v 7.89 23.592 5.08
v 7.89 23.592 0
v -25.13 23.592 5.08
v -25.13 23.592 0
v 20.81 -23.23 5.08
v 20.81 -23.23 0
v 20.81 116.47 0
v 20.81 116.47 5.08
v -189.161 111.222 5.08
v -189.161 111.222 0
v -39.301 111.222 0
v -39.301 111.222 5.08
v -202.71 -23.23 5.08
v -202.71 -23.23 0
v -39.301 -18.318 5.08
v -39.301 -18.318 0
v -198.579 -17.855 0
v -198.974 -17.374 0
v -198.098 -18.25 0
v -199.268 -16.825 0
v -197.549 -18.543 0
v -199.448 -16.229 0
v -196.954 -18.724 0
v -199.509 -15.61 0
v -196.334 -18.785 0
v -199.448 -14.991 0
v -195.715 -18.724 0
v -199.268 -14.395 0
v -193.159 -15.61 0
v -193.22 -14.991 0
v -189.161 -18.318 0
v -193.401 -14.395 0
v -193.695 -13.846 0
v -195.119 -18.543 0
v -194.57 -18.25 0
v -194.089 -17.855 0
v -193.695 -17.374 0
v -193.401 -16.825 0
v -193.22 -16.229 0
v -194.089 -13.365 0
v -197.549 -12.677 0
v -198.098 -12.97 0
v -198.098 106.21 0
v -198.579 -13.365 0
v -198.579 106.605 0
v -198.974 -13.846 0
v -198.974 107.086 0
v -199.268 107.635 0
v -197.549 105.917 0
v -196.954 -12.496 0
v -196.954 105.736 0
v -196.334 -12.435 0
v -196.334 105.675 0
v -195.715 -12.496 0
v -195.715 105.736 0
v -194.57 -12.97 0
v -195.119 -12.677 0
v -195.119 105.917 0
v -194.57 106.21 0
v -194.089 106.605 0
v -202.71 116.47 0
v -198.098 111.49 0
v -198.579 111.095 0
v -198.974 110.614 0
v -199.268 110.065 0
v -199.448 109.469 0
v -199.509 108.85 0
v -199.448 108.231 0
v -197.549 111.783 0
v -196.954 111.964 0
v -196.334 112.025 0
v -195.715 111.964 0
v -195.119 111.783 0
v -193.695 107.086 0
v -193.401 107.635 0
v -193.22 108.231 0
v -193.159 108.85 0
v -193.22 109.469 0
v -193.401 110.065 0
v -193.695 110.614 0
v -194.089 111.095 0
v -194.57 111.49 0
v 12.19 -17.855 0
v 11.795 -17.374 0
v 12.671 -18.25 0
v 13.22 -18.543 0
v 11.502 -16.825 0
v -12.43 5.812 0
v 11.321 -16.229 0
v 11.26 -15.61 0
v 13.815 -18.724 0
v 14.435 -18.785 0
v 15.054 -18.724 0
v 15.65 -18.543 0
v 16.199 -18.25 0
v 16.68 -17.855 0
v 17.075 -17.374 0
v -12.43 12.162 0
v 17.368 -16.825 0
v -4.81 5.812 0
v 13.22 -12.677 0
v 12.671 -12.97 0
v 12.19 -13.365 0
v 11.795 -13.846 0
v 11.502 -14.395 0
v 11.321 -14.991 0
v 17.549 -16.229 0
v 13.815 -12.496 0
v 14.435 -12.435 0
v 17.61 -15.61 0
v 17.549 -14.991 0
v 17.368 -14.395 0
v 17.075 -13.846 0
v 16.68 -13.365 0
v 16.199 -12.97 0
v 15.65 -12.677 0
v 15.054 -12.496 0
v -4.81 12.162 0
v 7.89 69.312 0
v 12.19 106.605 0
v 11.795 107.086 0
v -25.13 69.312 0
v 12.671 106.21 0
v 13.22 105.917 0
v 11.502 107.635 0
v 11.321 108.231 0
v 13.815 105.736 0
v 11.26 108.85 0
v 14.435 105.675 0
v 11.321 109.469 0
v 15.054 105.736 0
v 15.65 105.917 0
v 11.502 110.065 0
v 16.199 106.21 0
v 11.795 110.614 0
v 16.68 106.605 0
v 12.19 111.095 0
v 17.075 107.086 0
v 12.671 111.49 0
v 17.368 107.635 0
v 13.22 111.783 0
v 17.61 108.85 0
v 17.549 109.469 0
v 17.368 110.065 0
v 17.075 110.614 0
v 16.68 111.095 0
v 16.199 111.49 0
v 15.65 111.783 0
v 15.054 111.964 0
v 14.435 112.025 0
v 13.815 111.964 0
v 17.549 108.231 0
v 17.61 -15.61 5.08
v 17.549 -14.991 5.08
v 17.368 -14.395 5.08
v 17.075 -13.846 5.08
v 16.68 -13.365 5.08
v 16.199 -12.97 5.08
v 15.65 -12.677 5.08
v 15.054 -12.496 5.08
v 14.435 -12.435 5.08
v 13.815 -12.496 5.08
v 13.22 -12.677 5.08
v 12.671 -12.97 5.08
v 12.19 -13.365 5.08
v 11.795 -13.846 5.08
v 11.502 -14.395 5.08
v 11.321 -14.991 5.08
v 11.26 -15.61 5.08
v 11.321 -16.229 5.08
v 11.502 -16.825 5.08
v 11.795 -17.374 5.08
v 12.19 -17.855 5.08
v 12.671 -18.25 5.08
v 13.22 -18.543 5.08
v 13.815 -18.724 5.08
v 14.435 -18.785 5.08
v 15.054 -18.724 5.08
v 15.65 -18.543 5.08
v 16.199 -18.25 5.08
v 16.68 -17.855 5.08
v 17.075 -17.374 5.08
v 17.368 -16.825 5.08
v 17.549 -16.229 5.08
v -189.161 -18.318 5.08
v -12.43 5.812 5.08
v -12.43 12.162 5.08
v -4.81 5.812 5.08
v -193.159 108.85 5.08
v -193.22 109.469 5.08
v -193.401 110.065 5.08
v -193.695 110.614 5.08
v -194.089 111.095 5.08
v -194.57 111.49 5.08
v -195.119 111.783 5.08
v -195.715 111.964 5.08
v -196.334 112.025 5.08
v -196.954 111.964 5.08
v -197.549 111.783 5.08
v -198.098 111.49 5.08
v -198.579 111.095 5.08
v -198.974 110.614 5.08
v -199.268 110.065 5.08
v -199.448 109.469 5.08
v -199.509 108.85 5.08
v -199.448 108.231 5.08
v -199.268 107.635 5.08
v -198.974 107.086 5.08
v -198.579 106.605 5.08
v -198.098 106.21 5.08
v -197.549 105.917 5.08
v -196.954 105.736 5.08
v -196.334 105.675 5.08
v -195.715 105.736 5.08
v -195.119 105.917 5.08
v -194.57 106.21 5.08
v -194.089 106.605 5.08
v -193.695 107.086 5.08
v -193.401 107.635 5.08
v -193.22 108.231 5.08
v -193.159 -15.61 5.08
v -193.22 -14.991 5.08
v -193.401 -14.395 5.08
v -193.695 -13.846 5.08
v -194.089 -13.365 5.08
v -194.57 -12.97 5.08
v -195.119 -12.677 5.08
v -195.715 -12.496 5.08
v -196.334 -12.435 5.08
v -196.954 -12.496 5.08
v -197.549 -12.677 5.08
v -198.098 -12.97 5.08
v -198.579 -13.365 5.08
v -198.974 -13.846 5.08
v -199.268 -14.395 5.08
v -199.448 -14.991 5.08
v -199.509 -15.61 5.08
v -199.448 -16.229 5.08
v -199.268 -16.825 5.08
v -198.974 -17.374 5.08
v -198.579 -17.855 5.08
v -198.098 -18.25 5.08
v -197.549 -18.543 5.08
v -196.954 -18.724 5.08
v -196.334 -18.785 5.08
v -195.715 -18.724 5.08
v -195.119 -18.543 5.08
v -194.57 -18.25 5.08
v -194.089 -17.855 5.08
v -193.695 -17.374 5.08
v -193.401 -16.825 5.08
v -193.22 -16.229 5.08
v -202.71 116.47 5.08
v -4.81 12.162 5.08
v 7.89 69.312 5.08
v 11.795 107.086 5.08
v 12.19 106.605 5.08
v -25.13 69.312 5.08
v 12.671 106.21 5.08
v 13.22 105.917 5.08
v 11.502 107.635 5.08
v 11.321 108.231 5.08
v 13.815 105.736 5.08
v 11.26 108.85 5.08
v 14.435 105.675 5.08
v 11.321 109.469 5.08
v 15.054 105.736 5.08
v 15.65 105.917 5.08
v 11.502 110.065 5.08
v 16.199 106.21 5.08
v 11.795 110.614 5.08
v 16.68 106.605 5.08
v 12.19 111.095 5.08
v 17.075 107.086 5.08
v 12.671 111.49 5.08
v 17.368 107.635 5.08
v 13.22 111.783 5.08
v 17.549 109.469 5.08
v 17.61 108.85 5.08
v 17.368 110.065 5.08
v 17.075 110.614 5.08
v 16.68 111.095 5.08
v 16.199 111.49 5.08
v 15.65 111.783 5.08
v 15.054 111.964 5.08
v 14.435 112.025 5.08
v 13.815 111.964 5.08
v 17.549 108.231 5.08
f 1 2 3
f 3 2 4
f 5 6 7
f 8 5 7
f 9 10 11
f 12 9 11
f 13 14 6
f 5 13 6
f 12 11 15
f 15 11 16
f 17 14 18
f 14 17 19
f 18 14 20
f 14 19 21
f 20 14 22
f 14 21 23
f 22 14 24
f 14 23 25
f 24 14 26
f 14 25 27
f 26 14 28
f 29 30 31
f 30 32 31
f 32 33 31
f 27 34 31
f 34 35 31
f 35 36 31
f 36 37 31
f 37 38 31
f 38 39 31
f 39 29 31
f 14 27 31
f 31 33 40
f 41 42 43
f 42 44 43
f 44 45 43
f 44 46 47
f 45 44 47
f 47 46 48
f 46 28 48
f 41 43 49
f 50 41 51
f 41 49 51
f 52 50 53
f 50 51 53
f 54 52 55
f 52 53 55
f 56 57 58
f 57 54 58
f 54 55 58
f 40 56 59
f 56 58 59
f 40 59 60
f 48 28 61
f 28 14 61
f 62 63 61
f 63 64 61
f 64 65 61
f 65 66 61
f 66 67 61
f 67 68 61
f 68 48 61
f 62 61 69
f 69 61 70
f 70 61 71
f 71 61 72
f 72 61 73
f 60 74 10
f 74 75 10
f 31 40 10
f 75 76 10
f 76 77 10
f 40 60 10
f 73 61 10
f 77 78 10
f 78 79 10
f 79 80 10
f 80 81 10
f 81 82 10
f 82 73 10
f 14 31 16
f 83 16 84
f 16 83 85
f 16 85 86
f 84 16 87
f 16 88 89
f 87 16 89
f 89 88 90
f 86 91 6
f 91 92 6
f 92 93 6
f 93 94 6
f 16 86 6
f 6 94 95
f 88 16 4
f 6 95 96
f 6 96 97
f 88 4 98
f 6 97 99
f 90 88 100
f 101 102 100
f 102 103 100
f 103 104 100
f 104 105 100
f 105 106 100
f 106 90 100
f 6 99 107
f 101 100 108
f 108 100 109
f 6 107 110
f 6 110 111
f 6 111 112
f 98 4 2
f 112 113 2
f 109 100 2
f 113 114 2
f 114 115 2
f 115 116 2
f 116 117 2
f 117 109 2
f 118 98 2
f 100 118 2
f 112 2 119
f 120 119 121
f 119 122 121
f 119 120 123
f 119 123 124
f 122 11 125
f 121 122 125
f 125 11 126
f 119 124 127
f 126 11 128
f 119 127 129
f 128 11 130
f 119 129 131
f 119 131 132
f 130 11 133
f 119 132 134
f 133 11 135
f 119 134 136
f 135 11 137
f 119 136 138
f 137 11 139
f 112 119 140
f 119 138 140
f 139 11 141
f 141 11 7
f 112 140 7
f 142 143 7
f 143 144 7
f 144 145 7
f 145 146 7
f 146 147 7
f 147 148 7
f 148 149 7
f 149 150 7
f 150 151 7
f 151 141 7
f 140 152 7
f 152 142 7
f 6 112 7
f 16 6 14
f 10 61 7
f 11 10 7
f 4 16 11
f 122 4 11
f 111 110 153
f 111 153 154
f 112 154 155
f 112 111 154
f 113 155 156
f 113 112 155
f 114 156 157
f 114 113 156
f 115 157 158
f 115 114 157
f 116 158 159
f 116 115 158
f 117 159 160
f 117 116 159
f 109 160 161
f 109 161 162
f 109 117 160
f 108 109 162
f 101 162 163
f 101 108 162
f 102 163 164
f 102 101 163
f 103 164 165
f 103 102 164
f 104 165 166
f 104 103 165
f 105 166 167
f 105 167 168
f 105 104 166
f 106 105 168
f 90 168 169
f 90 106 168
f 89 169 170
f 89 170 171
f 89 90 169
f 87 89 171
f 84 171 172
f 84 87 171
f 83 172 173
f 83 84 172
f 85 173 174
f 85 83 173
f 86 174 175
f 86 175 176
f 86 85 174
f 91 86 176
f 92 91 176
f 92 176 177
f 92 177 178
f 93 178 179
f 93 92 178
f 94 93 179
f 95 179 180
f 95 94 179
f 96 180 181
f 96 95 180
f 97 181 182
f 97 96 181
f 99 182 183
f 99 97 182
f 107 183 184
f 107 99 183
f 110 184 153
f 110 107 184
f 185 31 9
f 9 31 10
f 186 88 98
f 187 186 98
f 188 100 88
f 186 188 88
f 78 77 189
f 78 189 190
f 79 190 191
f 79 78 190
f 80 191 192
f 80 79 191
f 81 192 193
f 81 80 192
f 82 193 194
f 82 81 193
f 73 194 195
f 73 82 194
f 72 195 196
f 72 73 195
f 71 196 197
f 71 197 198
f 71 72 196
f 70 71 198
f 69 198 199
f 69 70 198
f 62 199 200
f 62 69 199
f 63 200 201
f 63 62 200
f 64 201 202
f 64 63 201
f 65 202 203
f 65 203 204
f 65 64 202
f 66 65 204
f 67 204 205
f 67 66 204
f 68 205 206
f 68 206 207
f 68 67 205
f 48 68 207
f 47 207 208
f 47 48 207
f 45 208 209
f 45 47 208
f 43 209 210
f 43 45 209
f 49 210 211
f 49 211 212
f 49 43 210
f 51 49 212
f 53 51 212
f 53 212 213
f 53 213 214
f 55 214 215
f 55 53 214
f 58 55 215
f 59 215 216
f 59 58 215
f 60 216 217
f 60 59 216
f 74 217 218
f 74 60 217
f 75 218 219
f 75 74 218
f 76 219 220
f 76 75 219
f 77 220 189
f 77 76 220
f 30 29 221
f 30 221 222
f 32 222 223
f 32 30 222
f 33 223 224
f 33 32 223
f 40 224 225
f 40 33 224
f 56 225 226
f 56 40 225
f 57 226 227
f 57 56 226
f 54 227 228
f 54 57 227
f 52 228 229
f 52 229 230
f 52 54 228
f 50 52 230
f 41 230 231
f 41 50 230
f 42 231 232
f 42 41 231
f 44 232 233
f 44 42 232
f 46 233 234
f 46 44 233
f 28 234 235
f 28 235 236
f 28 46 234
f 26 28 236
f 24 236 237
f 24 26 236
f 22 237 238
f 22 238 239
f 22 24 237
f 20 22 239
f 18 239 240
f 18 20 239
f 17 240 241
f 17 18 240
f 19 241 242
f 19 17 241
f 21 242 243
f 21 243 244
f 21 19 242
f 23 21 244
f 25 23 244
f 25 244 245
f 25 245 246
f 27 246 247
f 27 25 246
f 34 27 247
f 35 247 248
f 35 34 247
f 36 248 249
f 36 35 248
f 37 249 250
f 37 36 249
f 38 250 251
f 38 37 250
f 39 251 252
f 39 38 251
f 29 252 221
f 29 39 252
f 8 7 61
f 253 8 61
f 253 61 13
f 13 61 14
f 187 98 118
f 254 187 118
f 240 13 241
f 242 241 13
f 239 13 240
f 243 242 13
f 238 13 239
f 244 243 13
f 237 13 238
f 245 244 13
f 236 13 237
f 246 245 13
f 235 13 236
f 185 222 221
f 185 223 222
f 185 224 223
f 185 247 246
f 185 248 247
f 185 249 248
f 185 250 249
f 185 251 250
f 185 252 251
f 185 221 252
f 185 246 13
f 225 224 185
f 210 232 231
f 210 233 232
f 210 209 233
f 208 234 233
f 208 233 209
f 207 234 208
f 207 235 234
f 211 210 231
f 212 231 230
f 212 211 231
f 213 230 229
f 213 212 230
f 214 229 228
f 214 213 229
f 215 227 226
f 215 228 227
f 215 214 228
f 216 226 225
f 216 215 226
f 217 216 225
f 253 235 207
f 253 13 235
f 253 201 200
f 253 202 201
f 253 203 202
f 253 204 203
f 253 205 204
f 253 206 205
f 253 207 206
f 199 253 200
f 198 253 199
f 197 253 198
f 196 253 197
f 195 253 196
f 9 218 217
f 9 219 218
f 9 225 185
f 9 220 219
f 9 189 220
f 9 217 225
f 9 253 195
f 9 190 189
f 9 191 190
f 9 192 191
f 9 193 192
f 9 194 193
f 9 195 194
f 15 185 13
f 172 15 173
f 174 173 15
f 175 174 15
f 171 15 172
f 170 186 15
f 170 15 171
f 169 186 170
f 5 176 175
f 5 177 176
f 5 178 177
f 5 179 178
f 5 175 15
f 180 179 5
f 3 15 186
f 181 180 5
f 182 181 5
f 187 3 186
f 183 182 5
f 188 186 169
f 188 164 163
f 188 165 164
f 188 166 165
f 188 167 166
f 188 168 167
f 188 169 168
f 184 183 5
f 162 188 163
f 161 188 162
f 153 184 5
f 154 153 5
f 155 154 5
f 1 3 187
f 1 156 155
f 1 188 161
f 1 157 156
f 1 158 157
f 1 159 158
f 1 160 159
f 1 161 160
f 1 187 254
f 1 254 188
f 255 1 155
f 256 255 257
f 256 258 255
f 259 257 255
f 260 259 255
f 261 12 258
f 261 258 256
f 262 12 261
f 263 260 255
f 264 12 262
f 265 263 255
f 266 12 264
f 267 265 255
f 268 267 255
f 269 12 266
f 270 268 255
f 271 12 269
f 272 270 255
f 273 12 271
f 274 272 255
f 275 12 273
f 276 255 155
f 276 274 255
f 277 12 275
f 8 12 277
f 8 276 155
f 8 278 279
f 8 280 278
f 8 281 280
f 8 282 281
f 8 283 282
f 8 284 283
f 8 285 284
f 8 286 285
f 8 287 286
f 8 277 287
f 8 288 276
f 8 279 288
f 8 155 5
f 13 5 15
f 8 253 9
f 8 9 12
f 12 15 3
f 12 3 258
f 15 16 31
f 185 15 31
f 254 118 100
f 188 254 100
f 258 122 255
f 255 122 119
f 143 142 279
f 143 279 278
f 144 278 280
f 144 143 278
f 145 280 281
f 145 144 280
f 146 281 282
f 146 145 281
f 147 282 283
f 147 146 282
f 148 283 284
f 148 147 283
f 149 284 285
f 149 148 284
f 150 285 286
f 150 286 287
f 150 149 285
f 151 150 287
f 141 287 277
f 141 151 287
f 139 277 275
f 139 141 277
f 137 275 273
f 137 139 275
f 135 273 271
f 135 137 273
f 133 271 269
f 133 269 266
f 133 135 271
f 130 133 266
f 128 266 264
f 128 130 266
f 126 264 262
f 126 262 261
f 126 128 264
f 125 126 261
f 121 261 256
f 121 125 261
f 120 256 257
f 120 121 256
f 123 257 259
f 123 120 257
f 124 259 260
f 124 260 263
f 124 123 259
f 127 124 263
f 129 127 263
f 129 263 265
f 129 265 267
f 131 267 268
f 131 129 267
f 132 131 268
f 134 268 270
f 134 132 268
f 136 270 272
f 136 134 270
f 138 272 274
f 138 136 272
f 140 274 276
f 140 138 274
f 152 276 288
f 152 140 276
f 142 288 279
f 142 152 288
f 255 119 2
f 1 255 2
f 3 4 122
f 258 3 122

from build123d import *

# Parameters (mm, degrees)
F0_R     = 3.175
F1_DEPTH = 5.08


with BuildPart() as f1:
    # F0 (on Top) → F1 (new body)
    with BuildSketch(Plane.XY):
        Polygon((-196.7800016522, 116.4700038791), (-196.7814051471, 116.4700038791), (-202.7097940445, 116.4700038791), (-202.7097940445, 108.8500038791), (-202.7097940445, 101.2300038791), (-202.7097940445, -23.2299961209), (-196.7800016522, -23.2299961209), (20.8102059555, -23.2299961209), (20.8102059555, 116.4700038791), (15.3085948529, 116.4700038791), (-35.4914051471, 116.4700038791), (-39.3014051471, 116.4700038791), (-90.9497940445, 116.4700038791), (-187.4697940445, 116.4700038791), (-189.1614051471, 116.4700038791), (-195.0897940445, 116.4700038791), align=None)
        with Locations((-196.3344303894, -15.6099961209)):
            Circle(F0_R, mode=Mode.SUBTRACT)
        Polygon((-189.1614051471, -18.3182691255), (-189.1614051471, 111.2217308745), (-189.1583133745, 111.2217308745), (-39.3014051471, 111.2217308745), (-39.3014051471, -18.3182691255), align=None, mode=Mode.SUBTRACT)
        with Locations((14.4348423004, -15.6099961209)):
            Circle(F0_R, mode=Mode.SUBTRACT)
        Polygon((-25.1297818765, 23.5917308745), (-25.1297818765, 69.3117308745), (7.8902181235, 69.3117308745), (7.8902181235, 23.5917308745), (7.8902181235, 5.8117308745), (-4.8097818765, 5.8117308745), (-8.6197818765, 5.8117308745), (-12.4297818765, 5.8117308745), (-25.1297818765, 5.8117308745), align=None, mode=Mode.SUBTRACT)
        with Locations((-196.3344303894, 108.8500038791)):
            Circle(F0_R, mode=Mode.SUBTRACT)
        with Locations((14.4348423004, 108.8500038791)):
            Circle(F0_R, mode=Mode.SUBTRACT)
        Polygon((7.8902181235, 23.5917308745), (-25.1297818765, 23.5917308745), (-25.1297818765, 5.8117308745), (-12.4297818765, 5.8117308745), (-12.4297818765, 12.1617308745), (-4.8097818765, 12.1617308745), (-4.8097818765, 5.8117308745), (7.8902181235, 5.8117308745), align=None)
    extrude(amount=F1_DEPTH)


solid = f1.part
